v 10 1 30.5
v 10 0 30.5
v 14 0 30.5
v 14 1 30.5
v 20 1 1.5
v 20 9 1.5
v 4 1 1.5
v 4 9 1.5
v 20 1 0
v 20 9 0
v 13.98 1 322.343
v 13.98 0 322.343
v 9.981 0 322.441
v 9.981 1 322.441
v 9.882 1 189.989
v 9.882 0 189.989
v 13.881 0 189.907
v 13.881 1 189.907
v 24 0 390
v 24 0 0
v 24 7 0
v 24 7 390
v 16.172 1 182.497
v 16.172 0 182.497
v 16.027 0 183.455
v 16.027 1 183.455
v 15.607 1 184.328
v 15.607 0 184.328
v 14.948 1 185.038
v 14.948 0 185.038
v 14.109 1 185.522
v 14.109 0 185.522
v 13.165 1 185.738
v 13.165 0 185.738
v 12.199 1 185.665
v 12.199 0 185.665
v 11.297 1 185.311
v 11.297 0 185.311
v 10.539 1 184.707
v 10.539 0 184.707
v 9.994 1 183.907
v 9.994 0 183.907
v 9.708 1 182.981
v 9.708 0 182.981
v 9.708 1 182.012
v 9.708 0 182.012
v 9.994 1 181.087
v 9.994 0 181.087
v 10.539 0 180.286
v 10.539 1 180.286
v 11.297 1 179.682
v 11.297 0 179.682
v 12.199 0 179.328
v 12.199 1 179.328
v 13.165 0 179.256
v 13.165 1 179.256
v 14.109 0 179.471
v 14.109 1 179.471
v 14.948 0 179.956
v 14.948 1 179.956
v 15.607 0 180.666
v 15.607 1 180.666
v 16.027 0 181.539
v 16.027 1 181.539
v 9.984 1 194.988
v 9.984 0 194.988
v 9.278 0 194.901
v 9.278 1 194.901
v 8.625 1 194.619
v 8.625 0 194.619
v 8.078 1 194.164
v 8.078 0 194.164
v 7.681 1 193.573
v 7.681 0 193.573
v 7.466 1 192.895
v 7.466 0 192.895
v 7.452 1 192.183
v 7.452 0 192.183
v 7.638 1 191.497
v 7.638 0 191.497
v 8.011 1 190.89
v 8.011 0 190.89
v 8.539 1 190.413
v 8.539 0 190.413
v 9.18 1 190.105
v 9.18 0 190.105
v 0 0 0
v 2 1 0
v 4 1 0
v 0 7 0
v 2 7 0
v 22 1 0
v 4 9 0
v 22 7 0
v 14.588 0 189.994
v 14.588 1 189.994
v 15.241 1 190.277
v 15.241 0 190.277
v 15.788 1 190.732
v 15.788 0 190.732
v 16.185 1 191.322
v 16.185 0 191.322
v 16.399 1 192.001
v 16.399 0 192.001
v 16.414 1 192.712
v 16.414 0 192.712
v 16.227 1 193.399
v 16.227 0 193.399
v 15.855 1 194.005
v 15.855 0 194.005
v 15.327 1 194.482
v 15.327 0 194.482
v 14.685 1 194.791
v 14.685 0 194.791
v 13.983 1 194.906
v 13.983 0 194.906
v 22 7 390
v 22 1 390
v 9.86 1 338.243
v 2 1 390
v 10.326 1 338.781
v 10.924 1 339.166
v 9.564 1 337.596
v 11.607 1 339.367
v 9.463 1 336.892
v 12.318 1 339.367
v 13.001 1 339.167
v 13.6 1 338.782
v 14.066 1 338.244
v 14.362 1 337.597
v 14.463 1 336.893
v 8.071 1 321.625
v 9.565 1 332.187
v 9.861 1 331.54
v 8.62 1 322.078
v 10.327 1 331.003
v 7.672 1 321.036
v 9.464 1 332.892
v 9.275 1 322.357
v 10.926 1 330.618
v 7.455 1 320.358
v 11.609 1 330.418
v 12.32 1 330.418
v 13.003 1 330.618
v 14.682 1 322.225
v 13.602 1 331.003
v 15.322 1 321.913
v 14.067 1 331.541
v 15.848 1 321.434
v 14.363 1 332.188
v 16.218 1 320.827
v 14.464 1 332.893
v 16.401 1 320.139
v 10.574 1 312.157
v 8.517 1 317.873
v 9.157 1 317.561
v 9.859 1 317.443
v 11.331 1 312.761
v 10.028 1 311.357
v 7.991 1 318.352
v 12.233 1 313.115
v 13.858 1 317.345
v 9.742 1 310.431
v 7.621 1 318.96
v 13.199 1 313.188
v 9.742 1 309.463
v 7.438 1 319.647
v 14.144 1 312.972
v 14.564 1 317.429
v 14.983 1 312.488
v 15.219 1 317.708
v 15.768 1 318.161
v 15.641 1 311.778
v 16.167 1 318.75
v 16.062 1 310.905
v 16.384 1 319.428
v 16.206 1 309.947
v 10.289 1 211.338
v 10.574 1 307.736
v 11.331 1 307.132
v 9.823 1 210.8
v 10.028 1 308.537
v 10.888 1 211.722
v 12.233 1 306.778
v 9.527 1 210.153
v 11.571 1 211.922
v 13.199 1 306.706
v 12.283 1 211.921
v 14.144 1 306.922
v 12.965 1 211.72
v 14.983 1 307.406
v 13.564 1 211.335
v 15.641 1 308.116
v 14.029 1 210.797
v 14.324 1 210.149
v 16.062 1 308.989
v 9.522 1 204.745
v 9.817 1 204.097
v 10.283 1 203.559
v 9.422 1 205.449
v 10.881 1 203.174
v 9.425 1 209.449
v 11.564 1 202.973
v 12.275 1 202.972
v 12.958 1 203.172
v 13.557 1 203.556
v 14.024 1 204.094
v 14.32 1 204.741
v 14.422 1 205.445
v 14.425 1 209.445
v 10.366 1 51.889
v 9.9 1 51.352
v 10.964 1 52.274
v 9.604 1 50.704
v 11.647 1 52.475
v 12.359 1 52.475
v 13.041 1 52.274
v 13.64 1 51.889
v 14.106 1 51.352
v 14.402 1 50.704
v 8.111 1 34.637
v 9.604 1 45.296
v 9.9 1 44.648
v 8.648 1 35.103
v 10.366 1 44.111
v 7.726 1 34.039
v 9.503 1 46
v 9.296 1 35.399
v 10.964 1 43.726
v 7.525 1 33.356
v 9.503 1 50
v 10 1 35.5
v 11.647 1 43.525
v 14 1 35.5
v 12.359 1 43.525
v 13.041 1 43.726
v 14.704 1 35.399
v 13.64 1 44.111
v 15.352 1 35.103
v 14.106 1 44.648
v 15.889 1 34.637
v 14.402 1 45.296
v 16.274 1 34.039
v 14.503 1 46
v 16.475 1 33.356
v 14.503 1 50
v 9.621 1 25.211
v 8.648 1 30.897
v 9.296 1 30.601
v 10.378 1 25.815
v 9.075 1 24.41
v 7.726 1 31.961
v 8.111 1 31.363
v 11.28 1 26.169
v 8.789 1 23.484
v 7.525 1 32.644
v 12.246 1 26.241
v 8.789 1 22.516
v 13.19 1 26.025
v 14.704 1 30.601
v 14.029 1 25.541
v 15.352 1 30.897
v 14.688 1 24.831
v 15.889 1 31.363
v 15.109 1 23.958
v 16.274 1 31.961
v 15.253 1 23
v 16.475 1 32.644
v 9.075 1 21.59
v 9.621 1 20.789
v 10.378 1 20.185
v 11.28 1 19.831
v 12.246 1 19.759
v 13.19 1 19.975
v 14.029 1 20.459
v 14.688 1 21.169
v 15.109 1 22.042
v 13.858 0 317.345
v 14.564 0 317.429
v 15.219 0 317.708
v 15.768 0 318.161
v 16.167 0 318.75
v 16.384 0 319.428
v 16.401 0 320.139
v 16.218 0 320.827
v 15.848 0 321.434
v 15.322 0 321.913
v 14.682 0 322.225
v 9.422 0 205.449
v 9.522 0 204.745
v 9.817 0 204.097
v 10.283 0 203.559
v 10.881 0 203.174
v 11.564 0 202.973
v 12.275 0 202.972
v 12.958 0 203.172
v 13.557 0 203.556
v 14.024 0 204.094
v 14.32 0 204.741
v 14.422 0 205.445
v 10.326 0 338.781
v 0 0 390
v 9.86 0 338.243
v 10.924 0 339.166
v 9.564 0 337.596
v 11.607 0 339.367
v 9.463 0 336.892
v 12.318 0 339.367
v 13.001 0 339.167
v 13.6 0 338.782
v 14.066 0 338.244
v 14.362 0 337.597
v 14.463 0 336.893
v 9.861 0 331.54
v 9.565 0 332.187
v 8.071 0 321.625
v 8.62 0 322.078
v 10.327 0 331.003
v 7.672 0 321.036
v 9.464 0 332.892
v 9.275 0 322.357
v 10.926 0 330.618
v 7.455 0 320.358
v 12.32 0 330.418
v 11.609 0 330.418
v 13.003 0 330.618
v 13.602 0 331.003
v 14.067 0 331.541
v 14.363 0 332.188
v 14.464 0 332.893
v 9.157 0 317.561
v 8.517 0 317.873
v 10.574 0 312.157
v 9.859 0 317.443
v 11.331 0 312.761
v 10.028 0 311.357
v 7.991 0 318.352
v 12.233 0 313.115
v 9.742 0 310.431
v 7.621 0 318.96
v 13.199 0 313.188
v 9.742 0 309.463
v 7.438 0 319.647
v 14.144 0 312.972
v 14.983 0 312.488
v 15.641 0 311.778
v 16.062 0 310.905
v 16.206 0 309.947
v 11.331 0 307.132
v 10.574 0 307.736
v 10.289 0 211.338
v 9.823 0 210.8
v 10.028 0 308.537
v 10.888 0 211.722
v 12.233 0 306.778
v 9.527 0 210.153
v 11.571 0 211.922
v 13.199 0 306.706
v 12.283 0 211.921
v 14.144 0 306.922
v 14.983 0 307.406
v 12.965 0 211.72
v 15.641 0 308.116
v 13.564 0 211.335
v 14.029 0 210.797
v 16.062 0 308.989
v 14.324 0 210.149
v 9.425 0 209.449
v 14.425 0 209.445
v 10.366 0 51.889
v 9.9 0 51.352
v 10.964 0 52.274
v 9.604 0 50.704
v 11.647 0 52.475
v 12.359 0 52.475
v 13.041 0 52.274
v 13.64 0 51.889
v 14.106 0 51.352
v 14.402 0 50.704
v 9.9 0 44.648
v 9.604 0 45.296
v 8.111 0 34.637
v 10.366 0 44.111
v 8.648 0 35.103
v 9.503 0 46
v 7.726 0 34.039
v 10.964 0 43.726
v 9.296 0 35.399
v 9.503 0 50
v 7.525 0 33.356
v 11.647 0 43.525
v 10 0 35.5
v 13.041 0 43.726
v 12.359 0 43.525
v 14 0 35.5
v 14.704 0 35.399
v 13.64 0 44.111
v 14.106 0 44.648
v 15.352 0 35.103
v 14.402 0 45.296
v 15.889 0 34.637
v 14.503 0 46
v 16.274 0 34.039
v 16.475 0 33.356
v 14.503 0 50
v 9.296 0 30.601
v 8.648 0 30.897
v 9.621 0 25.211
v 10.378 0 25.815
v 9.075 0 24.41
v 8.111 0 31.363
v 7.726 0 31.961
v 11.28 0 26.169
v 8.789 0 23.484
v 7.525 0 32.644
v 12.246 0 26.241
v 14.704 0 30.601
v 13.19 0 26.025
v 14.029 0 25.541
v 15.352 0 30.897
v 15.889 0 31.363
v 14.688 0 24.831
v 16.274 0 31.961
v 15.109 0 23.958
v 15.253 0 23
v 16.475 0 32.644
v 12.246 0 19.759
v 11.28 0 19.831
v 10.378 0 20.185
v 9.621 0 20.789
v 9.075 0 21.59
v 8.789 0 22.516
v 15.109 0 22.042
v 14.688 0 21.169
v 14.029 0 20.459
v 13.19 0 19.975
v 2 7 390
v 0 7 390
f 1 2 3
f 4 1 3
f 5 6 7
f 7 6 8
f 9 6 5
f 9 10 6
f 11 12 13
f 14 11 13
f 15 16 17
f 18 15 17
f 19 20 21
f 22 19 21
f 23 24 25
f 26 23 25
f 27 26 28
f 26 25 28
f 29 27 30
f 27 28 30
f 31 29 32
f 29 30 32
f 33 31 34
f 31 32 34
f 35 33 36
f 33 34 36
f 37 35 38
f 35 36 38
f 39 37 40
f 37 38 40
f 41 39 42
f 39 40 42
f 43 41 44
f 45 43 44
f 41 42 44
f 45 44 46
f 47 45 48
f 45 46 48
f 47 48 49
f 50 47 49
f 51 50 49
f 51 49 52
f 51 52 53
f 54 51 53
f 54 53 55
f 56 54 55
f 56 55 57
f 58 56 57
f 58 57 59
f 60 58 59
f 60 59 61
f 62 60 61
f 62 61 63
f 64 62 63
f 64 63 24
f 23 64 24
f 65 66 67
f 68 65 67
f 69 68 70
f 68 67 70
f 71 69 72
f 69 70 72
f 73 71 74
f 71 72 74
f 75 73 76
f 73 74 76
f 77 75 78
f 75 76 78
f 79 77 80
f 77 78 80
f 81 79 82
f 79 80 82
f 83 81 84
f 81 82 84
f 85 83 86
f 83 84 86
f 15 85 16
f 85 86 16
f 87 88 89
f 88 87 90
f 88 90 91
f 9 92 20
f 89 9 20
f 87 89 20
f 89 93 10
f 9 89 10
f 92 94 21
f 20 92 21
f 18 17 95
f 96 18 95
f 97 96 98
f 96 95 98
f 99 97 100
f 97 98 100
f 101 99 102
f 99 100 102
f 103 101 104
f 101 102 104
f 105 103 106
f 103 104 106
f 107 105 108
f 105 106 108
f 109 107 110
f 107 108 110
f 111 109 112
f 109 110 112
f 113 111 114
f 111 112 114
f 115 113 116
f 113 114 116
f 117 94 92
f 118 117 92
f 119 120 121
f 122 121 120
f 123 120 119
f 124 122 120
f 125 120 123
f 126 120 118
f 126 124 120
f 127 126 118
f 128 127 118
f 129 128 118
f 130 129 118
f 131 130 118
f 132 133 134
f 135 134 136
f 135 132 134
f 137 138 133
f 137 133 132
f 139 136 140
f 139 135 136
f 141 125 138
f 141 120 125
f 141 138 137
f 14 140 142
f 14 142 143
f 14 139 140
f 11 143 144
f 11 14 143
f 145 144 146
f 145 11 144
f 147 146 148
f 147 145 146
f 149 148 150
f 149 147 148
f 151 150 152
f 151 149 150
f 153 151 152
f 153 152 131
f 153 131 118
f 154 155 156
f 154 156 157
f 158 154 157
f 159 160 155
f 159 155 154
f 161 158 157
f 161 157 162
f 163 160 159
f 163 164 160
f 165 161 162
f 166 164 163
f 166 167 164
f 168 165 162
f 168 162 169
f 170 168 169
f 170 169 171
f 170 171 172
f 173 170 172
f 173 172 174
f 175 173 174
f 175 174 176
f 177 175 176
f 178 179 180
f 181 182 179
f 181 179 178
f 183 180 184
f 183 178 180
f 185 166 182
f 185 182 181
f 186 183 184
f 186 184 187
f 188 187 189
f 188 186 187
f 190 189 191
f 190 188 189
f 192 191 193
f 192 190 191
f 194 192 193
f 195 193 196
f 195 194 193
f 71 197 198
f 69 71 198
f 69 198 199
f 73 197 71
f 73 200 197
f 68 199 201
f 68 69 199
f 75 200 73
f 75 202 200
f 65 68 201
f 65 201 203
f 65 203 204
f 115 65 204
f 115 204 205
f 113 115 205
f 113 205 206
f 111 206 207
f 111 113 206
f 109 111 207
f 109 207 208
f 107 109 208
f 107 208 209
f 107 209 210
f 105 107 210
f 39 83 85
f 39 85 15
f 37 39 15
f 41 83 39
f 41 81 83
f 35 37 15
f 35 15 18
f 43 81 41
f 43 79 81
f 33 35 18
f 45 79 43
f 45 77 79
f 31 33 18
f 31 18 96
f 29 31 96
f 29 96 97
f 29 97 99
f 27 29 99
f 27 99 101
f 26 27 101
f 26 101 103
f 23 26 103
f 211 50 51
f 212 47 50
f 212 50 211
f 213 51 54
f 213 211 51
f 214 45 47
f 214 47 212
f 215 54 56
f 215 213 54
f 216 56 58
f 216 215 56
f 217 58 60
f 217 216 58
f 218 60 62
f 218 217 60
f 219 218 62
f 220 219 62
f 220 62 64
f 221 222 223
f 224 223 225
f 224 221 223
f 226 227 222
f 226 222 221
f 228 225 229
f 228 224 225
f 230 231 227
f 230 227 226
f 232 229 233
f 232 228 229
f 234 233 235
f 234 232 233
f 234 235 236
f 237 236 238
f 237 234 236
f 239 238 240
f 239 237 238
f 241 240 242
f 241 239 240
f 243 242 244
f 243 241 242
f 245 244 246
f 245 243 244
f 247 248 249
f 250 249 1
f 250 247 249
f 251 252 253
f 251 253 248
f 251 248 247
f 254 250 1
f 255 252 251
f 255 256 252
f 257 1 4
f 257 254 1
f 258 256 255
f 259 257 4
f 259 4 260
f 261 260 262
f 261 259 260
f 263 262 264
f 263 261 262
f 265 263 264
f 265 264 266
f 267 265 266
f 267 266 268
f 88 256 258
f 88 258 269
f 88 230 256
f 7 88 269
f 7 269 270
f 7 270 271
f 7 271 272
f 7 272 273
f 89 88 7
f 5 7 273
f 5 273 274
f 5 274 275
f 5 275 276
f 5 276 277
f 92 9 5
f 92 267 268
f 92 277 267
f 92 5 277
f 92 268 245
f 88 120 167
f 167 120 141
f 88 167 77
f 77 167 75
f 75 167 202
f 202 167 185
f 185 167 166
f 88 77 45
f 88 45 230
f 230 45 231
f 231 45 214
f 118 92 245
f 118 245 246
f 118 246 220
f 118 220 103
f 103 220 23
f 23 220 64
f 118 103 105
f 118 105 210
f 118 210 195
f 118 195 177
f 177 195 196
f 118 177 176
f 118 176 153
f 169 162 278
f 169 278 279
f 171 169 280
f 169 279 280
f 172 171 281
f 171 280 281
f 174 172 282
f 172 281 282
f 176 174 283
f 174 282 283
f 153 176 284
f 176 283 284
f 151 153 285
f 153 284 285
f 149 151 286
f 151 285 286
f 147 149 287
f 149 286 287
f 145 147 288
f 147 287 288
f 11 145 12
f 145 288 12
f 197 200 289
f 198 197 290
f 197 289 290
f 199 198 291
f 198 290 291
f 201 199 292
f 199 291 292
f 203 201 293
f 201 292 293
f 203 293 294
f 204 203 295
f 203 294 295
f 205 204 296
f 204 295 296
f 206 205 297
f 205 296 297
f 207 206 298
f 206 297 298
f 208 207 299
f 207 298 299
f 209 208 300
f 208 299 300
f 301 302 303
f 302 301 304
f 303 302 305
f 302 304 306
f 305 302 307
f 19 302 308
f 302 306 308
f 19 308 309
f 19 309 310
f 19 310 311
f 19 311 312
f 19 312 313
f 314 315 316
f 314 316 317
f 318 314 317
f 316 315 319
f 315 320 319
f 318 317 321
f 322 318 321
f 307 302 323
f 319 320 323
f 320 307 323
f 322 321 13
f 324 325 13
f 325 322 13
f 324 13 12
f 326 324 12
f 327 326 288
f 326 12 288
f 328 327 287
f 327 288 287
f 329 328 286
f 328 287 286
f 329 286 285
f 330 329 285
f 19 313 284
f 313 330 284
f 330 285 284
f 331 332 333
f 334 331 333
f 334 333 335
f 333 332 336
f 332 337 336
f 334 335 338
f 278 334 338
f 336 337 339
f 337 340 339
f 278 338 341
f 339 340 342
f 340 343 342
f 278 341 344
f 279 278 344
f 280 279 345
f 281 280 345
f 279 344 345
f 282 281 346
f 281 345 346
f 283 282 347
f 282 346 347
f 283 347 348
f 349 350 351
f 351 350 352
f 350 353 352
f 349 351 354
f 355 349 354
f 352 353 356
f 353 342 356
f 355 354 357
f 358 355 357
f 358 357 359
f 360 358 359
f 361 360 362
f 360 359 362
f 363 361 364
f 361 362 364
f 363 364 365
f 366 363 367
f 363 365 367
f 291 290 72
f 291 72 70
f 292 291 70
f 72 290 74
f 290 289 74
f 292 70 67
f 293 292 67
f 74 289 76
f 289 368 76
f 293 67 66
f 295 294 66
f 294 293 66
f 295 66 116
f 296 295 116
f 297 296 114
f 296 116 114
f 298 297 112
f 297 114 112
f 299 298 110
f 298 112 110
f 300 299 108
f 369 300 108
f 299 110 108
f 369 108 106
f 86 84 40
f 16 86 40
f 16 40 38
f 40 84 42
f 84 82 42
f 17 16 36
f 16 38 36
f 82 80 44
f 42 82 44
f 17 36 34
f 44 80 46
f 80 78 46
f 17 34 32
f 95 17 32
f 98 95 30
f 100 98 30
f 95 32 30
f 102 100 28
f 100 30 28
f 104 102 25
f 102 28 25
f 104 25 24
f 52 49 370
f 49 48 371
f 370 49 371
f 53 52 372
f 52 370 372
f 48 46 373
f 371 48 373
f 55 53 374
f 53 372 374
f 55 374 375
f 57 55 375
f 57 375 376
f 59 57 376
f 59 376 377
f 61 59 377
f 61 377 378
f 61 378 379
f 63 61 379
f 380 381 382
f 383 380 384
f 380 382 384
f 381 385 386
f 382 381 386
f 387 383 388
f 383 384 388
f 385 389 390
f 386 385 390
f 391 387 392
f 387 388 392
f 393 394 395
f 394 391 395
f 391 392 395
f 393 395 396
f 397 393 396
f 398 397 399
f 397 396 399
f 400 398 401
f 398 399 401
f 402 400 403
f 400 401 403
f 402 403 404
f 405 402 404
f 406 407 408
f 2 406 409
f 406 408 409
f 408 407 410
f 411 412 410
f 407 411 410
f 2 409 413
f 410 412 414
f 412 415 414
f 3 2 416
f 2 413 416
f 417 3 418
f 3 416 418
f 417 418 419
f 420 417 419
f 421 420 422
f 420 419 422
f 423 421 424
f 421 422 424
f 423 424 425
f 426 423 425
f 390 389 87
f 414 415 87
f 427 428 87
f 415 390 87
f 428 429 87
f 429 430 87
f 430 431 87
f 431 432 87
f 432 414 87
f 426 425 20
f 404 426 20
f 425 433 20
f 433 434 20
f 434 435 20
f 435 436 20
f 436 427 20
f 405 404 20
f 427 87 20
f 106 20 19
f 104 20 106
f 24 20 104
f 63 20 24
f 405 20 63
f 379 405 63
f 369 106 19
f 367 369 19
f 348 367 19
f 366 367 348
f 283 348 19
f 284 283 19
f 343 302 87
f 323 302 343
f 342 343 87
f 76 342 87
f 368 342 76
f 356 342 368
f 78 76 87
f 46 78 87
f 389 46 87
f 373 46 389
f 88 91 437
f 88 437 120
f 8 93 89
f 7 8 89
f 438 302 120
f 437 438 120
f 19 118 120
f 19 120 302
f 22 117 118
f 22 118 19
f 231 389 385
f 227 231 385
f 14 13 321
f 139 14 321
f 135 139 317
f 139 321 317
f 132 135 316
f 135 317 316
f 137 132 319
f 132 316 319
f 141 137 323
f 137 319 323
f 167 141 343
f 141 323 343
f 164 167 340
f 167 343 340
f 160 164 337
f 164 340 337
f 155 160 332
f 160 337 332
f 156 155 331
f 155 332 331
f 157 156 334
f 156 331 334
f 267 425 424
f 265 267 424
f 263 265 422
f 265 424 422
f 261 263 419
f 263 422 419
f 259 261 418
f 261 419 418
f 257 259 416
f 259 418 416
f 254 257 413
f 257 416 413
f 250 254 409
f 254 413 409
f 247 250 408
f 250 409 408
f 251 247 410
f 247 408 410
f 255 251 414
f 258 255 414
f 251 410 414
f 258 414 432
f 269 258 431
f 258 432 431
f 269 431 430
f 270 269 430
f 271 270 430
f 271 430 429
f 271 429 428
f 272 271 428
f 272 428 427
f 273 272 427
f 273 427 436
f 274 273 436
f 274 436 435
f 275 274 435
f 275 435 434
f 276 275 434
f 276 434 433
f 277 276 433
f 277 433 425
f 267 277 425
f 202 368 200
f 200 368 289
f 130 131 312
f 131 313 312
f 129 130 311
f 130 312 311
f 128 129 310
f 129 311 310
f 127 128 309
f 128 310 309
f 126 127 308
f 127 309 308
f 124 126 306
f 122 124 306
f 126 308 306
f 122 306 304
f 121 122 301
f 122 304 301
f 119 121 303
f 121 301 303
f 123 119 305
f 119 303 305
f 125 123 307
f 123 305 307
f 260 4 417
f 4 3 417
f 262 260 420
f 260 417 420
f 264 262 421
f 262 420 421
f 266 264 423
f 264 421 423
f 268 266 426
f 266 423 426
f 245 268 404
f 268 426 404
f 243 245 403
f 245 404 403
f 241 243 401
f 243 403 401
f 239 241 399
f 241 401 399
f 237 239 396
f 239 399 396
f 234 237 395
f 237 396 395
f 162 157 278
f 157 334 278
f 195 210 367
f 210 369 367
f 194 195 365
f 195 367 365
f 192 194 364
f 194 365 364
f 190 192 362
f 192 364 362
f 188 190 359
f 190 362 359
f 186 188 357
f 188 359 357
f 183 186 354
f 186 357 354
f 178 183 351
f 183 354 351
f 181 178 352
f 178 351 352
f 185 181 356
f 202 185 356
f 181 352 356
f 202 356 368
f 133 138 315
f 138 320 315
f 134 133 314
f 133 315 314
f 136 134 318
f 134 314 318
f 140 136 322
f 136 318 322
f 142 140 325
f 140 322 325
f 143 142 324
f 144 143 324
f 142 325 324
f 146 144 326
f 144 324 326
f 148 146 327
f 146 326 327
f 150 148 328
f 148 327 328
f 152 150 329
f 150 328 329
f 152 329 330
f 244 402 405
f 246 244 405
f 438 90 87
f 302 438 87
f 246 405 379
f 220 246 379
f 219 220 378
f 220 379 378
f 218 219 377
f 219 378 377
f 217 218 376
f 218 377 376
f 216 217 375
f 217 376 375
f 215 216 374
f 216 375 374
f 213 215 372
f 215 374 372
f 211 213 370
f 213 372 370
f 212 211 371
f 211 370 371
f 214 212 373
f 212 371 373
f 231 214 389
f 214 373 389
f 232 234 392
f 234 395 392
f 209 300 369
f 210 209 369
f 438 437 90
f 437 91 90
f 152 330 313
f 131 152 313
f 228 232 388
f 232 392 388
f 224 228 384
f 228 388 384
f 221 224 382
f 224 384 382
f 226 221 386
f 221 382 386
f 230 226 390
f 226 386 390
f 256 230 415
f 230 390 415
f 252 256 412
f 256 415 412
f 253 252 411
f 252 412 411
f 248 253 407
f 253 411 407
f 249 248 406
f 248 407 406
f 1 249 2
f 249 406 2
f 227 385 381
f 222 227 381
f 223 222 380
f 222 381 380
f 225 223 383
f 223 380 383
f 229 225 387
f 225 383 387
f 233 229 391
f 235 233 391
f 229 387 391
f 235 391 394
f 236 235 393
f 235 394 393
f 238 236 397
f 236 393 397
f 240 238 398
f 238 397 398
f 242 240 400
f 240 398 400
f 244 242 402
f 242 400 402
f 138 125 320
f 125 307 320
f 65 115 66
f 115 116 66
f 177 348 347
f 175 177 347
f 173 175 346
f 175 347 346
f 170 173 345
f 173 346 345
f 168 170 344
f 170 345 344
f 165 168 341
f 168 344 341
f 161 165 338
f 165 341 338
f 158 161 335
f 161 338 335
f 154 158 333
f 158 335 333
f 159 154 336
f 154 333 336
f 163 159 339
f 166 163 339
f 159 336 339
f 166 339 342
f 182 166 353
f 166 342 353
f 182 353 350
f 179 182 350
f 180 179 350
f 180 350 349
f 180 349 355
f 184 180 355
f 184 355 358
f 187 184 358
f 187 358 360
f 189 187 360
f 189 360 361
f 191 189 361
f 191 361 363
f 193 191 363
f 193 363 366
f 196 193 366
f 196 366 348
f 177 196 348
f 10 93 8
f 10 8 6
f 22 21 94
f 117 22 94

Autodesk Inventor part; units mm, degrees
ref_plane "YZ Plane" through (0, 0, 0) normal (1, 0, 0) x (0, 1, 0)
ref_plane "XZ Plane" through (0, 0, 0) normal (0, 1, 0) x (-1, 0, 0)
ref_plane "XY Plane" through (0, 0, 0) normal (0, 0, 1) x (1, 0, 0)
sketch "Эскиз1" plane through (0, 0, 0) normal (0, 0, 1) x (1, 0, 0)
  line L0 (0, 0) -> (24, 0)
  line L1 (24, 0) -> (24, 7)
  line L2 (24, 7) -> (0, 7)
  line L3 (0, 7) -> (0, 0)
  line L4 (0, 1) -> (24, 1)
  line L5 (2, 7) -> (2, 0)
  line L6 (22, 7) -> (22, 0)
  point P0 (0, 3.5)
  point P1 (12, 0)
  point P2 (2, 1)
  point P3 (22, 1)
  dimension "d0" = 24
  dimension "d1" = 7
  dimension "d2" = 2
  dimension "d3" = 2
  dimension "d4" = 1
extrude "Выдавливание1" add sketch "Эскиз1" along normal blind 390 contours L3 L4 L5 L0 | L5 L4 L6 L0 | L3 L2 L5 L4 | L6 L4 L1 L0 | L6 L2 L1 L4
sketch "Эскиз3" plane through (0, 0, 0) normal (0, -1, 0) x (1, 0, 0)
  line L0 (12.0032, 0) -> (12, 390)
  line L1 (22, 390) -> (2, 390) projected
  circle A0 centre (12.003, 23) radius 3.25
  line L2 (0, 0) -> (24, 0) projected
  line L3 (7.5, 33) -> (16.5, 33) construction
  line L4 (24, 0) -> (24, 390) projected
  line L5 (10, 30.5) -> (14, 30.5)
  line L6 (14, 35.5) -> (10, 35.5)
  arc A1 (10, 35.5) -> (10, 30.5) centre (10, 33) ccw
  arc A2 (14, 30.5) -> (14, 35.5) centre (14, 33) ccw
  line L7 (12.0029, 43.5) -> (12.0028, 52.5) construction
  line L8 (14.5028, 46) -> (14.5028, 50)
  line L9 (9.5028, 50) -> (9.5028, 46)
  arc A3 (9.5028, 46) -> (14.5028, 46) centre (12.0028, 46) ccw
  arc A4 (14.5028, 50) -> (9.5028, 50) centre (12.0028, 50) ccw
  circle A5 centre (12.9217, 182.4968) radius 3.25
  line L10 (7.4336, 192.5395) -> (16.4317, 192.3559) construction
  line L11 (9.8821, 189.989) -> (13.8813, 189.9074)
  line L12 (13.9833, 194.9064) -> (9.9841, 194.988)
  arc A6 (9.9841, 194.988) -> (9.8821, 189.989) centre (9.9331, 192.4885) ccw
  arc A7 (13.8813, 189.9074) -> (13.9833, 194.9064) centre (13.9323, 192.4069) ccw
  line L13 (11.9196, 202.9469) -> (11.9271, 211.9469) construction
  line L14 (14.4217, 205.4448) -> (14.425, 209.4448)
  line L15 (9.425, 209.449) -> (9.4217, 205.449)
  arc A8 (9.4217, 205.449) -> (14.4217, 205.4448) centre (11.9217, 205.4469) ccw
  arc A9 (14.425, 209.4448) -> (9.425, 209.449) centre (11.925, 209.4469) ccw
  line L16 (11.9646, 330.3923) -> (11.9626, 339.3923) construction
  line L17 (14.464, 332.8928) -> (14.4632, 336.8928)
  arc A10 (14.4632, 336.8928) -> (9.4632, 336.8918) centre (11.9632, 336.8923) ccw
  arc A11 (9.464, 332.8918) -> (14.464, 332.8928) centre (11.964, 332.8923) ccw
  line L18 (7.4209, 320.0033) -> (16.4182, 319.7828) construction
  arc A12 (9.9814, 322.4413) -> (9.8589, 317.4428) centre (9.9201, 319.9421) ccw
  circle A13 centre (12.9562, 309.9469) radius 3.25
  line L19 (9.4632, 336.8918) -> (9.464, 332.8918)
  line L20 (13.9802, 322.3433) -> (9.9814, 322.4413)
  arc A14 (13.8577, 317.3448) -> (13.9802, 322.3433) centre (13.9189, 319.844) ccw
  line L21 (9.8589, 317.4428) -> (13.8577, 317.3448)
  point P0 (12, 33)
  point P1 (12.0028, 48)
  point P2 (12, 35.5)
  point P3 (11.9327, 192.4477)
  point P4 (11.9233, 207.4469)
  point P5 (11.9837, 194.9472)
  point P6 (12.0028, 52.5)
  point P7 (11.9636, 334.8923)
  point P8 (11.9646, 330.3923)
  point P9 (11.9195, 319.8931)
  point P10 (11.9808, 322.3923)
  point P11 (11.9271, 211.9469)
  dimension "d7" = 6.5
  dimension "d8" = 23
  dimension "d9" = 9
  dimension "d10" = 5
  dimension "d11" = 10
  dimension "d12" = 9
  dimension "d13" = 5
  dimension "d14" = 8
  dimension "d15" = 6.5
  dimension "d16" = 9
  dimension "d17" = 5
  dimension "d18" = 10
  dimension "d19" = 9
  dimension "d20" = 5
  dimension "d21" = 8
  dimension "d22" = 130
  dimension "d23" = 6.5
  dimension "d24" = 9
  dimension "d25" = 5
  dimension "d26" = 10
  dimension "d27" = 9
  dimension "d28" = 5
  dimension "d29" = 8
  dimension "d30" = 98
extrude "Выдавливание2" cut sketch "Эскиз3" against normal blind 10
sketch "Эскиз4" plane through (0, 0, 0) normal (0, 0, -1) x (-1, 0, 0)
  line L0 (-2, 7) -> (0, 7) projected
  line L1 (-2, 1) -> (-2, 7) projected
  line L2 (-22, 1) -> (-2, 1) projected
  line L3 (-22, 7) -> (-22, 1) projected
  line L4 (-24, 7) -> (-22, 7) projected
  line L5 (-24, 0) -> (-24, 7) projected
  line L6 (0, 0) -> (-24, 0) projected
  line L7 (0, 7) -> (0, 0) projected
  line L8 (-12, 9) -> (-20, 9)
  line L9 (-20, 9) -> (-20, 0)
  line L10 (-12, 9) -> (-4, 9)
  line L11 (-4, 9) -> (-4, 0)
  point P0 (-20, 1)
  point P1 (-4, 1)
extrude "Выдавливание3" add sketch "Эскиз4" against normal blind 1.5 contours L2 L9 L8 L10 L11
properties part number "3 часть направляшки"
